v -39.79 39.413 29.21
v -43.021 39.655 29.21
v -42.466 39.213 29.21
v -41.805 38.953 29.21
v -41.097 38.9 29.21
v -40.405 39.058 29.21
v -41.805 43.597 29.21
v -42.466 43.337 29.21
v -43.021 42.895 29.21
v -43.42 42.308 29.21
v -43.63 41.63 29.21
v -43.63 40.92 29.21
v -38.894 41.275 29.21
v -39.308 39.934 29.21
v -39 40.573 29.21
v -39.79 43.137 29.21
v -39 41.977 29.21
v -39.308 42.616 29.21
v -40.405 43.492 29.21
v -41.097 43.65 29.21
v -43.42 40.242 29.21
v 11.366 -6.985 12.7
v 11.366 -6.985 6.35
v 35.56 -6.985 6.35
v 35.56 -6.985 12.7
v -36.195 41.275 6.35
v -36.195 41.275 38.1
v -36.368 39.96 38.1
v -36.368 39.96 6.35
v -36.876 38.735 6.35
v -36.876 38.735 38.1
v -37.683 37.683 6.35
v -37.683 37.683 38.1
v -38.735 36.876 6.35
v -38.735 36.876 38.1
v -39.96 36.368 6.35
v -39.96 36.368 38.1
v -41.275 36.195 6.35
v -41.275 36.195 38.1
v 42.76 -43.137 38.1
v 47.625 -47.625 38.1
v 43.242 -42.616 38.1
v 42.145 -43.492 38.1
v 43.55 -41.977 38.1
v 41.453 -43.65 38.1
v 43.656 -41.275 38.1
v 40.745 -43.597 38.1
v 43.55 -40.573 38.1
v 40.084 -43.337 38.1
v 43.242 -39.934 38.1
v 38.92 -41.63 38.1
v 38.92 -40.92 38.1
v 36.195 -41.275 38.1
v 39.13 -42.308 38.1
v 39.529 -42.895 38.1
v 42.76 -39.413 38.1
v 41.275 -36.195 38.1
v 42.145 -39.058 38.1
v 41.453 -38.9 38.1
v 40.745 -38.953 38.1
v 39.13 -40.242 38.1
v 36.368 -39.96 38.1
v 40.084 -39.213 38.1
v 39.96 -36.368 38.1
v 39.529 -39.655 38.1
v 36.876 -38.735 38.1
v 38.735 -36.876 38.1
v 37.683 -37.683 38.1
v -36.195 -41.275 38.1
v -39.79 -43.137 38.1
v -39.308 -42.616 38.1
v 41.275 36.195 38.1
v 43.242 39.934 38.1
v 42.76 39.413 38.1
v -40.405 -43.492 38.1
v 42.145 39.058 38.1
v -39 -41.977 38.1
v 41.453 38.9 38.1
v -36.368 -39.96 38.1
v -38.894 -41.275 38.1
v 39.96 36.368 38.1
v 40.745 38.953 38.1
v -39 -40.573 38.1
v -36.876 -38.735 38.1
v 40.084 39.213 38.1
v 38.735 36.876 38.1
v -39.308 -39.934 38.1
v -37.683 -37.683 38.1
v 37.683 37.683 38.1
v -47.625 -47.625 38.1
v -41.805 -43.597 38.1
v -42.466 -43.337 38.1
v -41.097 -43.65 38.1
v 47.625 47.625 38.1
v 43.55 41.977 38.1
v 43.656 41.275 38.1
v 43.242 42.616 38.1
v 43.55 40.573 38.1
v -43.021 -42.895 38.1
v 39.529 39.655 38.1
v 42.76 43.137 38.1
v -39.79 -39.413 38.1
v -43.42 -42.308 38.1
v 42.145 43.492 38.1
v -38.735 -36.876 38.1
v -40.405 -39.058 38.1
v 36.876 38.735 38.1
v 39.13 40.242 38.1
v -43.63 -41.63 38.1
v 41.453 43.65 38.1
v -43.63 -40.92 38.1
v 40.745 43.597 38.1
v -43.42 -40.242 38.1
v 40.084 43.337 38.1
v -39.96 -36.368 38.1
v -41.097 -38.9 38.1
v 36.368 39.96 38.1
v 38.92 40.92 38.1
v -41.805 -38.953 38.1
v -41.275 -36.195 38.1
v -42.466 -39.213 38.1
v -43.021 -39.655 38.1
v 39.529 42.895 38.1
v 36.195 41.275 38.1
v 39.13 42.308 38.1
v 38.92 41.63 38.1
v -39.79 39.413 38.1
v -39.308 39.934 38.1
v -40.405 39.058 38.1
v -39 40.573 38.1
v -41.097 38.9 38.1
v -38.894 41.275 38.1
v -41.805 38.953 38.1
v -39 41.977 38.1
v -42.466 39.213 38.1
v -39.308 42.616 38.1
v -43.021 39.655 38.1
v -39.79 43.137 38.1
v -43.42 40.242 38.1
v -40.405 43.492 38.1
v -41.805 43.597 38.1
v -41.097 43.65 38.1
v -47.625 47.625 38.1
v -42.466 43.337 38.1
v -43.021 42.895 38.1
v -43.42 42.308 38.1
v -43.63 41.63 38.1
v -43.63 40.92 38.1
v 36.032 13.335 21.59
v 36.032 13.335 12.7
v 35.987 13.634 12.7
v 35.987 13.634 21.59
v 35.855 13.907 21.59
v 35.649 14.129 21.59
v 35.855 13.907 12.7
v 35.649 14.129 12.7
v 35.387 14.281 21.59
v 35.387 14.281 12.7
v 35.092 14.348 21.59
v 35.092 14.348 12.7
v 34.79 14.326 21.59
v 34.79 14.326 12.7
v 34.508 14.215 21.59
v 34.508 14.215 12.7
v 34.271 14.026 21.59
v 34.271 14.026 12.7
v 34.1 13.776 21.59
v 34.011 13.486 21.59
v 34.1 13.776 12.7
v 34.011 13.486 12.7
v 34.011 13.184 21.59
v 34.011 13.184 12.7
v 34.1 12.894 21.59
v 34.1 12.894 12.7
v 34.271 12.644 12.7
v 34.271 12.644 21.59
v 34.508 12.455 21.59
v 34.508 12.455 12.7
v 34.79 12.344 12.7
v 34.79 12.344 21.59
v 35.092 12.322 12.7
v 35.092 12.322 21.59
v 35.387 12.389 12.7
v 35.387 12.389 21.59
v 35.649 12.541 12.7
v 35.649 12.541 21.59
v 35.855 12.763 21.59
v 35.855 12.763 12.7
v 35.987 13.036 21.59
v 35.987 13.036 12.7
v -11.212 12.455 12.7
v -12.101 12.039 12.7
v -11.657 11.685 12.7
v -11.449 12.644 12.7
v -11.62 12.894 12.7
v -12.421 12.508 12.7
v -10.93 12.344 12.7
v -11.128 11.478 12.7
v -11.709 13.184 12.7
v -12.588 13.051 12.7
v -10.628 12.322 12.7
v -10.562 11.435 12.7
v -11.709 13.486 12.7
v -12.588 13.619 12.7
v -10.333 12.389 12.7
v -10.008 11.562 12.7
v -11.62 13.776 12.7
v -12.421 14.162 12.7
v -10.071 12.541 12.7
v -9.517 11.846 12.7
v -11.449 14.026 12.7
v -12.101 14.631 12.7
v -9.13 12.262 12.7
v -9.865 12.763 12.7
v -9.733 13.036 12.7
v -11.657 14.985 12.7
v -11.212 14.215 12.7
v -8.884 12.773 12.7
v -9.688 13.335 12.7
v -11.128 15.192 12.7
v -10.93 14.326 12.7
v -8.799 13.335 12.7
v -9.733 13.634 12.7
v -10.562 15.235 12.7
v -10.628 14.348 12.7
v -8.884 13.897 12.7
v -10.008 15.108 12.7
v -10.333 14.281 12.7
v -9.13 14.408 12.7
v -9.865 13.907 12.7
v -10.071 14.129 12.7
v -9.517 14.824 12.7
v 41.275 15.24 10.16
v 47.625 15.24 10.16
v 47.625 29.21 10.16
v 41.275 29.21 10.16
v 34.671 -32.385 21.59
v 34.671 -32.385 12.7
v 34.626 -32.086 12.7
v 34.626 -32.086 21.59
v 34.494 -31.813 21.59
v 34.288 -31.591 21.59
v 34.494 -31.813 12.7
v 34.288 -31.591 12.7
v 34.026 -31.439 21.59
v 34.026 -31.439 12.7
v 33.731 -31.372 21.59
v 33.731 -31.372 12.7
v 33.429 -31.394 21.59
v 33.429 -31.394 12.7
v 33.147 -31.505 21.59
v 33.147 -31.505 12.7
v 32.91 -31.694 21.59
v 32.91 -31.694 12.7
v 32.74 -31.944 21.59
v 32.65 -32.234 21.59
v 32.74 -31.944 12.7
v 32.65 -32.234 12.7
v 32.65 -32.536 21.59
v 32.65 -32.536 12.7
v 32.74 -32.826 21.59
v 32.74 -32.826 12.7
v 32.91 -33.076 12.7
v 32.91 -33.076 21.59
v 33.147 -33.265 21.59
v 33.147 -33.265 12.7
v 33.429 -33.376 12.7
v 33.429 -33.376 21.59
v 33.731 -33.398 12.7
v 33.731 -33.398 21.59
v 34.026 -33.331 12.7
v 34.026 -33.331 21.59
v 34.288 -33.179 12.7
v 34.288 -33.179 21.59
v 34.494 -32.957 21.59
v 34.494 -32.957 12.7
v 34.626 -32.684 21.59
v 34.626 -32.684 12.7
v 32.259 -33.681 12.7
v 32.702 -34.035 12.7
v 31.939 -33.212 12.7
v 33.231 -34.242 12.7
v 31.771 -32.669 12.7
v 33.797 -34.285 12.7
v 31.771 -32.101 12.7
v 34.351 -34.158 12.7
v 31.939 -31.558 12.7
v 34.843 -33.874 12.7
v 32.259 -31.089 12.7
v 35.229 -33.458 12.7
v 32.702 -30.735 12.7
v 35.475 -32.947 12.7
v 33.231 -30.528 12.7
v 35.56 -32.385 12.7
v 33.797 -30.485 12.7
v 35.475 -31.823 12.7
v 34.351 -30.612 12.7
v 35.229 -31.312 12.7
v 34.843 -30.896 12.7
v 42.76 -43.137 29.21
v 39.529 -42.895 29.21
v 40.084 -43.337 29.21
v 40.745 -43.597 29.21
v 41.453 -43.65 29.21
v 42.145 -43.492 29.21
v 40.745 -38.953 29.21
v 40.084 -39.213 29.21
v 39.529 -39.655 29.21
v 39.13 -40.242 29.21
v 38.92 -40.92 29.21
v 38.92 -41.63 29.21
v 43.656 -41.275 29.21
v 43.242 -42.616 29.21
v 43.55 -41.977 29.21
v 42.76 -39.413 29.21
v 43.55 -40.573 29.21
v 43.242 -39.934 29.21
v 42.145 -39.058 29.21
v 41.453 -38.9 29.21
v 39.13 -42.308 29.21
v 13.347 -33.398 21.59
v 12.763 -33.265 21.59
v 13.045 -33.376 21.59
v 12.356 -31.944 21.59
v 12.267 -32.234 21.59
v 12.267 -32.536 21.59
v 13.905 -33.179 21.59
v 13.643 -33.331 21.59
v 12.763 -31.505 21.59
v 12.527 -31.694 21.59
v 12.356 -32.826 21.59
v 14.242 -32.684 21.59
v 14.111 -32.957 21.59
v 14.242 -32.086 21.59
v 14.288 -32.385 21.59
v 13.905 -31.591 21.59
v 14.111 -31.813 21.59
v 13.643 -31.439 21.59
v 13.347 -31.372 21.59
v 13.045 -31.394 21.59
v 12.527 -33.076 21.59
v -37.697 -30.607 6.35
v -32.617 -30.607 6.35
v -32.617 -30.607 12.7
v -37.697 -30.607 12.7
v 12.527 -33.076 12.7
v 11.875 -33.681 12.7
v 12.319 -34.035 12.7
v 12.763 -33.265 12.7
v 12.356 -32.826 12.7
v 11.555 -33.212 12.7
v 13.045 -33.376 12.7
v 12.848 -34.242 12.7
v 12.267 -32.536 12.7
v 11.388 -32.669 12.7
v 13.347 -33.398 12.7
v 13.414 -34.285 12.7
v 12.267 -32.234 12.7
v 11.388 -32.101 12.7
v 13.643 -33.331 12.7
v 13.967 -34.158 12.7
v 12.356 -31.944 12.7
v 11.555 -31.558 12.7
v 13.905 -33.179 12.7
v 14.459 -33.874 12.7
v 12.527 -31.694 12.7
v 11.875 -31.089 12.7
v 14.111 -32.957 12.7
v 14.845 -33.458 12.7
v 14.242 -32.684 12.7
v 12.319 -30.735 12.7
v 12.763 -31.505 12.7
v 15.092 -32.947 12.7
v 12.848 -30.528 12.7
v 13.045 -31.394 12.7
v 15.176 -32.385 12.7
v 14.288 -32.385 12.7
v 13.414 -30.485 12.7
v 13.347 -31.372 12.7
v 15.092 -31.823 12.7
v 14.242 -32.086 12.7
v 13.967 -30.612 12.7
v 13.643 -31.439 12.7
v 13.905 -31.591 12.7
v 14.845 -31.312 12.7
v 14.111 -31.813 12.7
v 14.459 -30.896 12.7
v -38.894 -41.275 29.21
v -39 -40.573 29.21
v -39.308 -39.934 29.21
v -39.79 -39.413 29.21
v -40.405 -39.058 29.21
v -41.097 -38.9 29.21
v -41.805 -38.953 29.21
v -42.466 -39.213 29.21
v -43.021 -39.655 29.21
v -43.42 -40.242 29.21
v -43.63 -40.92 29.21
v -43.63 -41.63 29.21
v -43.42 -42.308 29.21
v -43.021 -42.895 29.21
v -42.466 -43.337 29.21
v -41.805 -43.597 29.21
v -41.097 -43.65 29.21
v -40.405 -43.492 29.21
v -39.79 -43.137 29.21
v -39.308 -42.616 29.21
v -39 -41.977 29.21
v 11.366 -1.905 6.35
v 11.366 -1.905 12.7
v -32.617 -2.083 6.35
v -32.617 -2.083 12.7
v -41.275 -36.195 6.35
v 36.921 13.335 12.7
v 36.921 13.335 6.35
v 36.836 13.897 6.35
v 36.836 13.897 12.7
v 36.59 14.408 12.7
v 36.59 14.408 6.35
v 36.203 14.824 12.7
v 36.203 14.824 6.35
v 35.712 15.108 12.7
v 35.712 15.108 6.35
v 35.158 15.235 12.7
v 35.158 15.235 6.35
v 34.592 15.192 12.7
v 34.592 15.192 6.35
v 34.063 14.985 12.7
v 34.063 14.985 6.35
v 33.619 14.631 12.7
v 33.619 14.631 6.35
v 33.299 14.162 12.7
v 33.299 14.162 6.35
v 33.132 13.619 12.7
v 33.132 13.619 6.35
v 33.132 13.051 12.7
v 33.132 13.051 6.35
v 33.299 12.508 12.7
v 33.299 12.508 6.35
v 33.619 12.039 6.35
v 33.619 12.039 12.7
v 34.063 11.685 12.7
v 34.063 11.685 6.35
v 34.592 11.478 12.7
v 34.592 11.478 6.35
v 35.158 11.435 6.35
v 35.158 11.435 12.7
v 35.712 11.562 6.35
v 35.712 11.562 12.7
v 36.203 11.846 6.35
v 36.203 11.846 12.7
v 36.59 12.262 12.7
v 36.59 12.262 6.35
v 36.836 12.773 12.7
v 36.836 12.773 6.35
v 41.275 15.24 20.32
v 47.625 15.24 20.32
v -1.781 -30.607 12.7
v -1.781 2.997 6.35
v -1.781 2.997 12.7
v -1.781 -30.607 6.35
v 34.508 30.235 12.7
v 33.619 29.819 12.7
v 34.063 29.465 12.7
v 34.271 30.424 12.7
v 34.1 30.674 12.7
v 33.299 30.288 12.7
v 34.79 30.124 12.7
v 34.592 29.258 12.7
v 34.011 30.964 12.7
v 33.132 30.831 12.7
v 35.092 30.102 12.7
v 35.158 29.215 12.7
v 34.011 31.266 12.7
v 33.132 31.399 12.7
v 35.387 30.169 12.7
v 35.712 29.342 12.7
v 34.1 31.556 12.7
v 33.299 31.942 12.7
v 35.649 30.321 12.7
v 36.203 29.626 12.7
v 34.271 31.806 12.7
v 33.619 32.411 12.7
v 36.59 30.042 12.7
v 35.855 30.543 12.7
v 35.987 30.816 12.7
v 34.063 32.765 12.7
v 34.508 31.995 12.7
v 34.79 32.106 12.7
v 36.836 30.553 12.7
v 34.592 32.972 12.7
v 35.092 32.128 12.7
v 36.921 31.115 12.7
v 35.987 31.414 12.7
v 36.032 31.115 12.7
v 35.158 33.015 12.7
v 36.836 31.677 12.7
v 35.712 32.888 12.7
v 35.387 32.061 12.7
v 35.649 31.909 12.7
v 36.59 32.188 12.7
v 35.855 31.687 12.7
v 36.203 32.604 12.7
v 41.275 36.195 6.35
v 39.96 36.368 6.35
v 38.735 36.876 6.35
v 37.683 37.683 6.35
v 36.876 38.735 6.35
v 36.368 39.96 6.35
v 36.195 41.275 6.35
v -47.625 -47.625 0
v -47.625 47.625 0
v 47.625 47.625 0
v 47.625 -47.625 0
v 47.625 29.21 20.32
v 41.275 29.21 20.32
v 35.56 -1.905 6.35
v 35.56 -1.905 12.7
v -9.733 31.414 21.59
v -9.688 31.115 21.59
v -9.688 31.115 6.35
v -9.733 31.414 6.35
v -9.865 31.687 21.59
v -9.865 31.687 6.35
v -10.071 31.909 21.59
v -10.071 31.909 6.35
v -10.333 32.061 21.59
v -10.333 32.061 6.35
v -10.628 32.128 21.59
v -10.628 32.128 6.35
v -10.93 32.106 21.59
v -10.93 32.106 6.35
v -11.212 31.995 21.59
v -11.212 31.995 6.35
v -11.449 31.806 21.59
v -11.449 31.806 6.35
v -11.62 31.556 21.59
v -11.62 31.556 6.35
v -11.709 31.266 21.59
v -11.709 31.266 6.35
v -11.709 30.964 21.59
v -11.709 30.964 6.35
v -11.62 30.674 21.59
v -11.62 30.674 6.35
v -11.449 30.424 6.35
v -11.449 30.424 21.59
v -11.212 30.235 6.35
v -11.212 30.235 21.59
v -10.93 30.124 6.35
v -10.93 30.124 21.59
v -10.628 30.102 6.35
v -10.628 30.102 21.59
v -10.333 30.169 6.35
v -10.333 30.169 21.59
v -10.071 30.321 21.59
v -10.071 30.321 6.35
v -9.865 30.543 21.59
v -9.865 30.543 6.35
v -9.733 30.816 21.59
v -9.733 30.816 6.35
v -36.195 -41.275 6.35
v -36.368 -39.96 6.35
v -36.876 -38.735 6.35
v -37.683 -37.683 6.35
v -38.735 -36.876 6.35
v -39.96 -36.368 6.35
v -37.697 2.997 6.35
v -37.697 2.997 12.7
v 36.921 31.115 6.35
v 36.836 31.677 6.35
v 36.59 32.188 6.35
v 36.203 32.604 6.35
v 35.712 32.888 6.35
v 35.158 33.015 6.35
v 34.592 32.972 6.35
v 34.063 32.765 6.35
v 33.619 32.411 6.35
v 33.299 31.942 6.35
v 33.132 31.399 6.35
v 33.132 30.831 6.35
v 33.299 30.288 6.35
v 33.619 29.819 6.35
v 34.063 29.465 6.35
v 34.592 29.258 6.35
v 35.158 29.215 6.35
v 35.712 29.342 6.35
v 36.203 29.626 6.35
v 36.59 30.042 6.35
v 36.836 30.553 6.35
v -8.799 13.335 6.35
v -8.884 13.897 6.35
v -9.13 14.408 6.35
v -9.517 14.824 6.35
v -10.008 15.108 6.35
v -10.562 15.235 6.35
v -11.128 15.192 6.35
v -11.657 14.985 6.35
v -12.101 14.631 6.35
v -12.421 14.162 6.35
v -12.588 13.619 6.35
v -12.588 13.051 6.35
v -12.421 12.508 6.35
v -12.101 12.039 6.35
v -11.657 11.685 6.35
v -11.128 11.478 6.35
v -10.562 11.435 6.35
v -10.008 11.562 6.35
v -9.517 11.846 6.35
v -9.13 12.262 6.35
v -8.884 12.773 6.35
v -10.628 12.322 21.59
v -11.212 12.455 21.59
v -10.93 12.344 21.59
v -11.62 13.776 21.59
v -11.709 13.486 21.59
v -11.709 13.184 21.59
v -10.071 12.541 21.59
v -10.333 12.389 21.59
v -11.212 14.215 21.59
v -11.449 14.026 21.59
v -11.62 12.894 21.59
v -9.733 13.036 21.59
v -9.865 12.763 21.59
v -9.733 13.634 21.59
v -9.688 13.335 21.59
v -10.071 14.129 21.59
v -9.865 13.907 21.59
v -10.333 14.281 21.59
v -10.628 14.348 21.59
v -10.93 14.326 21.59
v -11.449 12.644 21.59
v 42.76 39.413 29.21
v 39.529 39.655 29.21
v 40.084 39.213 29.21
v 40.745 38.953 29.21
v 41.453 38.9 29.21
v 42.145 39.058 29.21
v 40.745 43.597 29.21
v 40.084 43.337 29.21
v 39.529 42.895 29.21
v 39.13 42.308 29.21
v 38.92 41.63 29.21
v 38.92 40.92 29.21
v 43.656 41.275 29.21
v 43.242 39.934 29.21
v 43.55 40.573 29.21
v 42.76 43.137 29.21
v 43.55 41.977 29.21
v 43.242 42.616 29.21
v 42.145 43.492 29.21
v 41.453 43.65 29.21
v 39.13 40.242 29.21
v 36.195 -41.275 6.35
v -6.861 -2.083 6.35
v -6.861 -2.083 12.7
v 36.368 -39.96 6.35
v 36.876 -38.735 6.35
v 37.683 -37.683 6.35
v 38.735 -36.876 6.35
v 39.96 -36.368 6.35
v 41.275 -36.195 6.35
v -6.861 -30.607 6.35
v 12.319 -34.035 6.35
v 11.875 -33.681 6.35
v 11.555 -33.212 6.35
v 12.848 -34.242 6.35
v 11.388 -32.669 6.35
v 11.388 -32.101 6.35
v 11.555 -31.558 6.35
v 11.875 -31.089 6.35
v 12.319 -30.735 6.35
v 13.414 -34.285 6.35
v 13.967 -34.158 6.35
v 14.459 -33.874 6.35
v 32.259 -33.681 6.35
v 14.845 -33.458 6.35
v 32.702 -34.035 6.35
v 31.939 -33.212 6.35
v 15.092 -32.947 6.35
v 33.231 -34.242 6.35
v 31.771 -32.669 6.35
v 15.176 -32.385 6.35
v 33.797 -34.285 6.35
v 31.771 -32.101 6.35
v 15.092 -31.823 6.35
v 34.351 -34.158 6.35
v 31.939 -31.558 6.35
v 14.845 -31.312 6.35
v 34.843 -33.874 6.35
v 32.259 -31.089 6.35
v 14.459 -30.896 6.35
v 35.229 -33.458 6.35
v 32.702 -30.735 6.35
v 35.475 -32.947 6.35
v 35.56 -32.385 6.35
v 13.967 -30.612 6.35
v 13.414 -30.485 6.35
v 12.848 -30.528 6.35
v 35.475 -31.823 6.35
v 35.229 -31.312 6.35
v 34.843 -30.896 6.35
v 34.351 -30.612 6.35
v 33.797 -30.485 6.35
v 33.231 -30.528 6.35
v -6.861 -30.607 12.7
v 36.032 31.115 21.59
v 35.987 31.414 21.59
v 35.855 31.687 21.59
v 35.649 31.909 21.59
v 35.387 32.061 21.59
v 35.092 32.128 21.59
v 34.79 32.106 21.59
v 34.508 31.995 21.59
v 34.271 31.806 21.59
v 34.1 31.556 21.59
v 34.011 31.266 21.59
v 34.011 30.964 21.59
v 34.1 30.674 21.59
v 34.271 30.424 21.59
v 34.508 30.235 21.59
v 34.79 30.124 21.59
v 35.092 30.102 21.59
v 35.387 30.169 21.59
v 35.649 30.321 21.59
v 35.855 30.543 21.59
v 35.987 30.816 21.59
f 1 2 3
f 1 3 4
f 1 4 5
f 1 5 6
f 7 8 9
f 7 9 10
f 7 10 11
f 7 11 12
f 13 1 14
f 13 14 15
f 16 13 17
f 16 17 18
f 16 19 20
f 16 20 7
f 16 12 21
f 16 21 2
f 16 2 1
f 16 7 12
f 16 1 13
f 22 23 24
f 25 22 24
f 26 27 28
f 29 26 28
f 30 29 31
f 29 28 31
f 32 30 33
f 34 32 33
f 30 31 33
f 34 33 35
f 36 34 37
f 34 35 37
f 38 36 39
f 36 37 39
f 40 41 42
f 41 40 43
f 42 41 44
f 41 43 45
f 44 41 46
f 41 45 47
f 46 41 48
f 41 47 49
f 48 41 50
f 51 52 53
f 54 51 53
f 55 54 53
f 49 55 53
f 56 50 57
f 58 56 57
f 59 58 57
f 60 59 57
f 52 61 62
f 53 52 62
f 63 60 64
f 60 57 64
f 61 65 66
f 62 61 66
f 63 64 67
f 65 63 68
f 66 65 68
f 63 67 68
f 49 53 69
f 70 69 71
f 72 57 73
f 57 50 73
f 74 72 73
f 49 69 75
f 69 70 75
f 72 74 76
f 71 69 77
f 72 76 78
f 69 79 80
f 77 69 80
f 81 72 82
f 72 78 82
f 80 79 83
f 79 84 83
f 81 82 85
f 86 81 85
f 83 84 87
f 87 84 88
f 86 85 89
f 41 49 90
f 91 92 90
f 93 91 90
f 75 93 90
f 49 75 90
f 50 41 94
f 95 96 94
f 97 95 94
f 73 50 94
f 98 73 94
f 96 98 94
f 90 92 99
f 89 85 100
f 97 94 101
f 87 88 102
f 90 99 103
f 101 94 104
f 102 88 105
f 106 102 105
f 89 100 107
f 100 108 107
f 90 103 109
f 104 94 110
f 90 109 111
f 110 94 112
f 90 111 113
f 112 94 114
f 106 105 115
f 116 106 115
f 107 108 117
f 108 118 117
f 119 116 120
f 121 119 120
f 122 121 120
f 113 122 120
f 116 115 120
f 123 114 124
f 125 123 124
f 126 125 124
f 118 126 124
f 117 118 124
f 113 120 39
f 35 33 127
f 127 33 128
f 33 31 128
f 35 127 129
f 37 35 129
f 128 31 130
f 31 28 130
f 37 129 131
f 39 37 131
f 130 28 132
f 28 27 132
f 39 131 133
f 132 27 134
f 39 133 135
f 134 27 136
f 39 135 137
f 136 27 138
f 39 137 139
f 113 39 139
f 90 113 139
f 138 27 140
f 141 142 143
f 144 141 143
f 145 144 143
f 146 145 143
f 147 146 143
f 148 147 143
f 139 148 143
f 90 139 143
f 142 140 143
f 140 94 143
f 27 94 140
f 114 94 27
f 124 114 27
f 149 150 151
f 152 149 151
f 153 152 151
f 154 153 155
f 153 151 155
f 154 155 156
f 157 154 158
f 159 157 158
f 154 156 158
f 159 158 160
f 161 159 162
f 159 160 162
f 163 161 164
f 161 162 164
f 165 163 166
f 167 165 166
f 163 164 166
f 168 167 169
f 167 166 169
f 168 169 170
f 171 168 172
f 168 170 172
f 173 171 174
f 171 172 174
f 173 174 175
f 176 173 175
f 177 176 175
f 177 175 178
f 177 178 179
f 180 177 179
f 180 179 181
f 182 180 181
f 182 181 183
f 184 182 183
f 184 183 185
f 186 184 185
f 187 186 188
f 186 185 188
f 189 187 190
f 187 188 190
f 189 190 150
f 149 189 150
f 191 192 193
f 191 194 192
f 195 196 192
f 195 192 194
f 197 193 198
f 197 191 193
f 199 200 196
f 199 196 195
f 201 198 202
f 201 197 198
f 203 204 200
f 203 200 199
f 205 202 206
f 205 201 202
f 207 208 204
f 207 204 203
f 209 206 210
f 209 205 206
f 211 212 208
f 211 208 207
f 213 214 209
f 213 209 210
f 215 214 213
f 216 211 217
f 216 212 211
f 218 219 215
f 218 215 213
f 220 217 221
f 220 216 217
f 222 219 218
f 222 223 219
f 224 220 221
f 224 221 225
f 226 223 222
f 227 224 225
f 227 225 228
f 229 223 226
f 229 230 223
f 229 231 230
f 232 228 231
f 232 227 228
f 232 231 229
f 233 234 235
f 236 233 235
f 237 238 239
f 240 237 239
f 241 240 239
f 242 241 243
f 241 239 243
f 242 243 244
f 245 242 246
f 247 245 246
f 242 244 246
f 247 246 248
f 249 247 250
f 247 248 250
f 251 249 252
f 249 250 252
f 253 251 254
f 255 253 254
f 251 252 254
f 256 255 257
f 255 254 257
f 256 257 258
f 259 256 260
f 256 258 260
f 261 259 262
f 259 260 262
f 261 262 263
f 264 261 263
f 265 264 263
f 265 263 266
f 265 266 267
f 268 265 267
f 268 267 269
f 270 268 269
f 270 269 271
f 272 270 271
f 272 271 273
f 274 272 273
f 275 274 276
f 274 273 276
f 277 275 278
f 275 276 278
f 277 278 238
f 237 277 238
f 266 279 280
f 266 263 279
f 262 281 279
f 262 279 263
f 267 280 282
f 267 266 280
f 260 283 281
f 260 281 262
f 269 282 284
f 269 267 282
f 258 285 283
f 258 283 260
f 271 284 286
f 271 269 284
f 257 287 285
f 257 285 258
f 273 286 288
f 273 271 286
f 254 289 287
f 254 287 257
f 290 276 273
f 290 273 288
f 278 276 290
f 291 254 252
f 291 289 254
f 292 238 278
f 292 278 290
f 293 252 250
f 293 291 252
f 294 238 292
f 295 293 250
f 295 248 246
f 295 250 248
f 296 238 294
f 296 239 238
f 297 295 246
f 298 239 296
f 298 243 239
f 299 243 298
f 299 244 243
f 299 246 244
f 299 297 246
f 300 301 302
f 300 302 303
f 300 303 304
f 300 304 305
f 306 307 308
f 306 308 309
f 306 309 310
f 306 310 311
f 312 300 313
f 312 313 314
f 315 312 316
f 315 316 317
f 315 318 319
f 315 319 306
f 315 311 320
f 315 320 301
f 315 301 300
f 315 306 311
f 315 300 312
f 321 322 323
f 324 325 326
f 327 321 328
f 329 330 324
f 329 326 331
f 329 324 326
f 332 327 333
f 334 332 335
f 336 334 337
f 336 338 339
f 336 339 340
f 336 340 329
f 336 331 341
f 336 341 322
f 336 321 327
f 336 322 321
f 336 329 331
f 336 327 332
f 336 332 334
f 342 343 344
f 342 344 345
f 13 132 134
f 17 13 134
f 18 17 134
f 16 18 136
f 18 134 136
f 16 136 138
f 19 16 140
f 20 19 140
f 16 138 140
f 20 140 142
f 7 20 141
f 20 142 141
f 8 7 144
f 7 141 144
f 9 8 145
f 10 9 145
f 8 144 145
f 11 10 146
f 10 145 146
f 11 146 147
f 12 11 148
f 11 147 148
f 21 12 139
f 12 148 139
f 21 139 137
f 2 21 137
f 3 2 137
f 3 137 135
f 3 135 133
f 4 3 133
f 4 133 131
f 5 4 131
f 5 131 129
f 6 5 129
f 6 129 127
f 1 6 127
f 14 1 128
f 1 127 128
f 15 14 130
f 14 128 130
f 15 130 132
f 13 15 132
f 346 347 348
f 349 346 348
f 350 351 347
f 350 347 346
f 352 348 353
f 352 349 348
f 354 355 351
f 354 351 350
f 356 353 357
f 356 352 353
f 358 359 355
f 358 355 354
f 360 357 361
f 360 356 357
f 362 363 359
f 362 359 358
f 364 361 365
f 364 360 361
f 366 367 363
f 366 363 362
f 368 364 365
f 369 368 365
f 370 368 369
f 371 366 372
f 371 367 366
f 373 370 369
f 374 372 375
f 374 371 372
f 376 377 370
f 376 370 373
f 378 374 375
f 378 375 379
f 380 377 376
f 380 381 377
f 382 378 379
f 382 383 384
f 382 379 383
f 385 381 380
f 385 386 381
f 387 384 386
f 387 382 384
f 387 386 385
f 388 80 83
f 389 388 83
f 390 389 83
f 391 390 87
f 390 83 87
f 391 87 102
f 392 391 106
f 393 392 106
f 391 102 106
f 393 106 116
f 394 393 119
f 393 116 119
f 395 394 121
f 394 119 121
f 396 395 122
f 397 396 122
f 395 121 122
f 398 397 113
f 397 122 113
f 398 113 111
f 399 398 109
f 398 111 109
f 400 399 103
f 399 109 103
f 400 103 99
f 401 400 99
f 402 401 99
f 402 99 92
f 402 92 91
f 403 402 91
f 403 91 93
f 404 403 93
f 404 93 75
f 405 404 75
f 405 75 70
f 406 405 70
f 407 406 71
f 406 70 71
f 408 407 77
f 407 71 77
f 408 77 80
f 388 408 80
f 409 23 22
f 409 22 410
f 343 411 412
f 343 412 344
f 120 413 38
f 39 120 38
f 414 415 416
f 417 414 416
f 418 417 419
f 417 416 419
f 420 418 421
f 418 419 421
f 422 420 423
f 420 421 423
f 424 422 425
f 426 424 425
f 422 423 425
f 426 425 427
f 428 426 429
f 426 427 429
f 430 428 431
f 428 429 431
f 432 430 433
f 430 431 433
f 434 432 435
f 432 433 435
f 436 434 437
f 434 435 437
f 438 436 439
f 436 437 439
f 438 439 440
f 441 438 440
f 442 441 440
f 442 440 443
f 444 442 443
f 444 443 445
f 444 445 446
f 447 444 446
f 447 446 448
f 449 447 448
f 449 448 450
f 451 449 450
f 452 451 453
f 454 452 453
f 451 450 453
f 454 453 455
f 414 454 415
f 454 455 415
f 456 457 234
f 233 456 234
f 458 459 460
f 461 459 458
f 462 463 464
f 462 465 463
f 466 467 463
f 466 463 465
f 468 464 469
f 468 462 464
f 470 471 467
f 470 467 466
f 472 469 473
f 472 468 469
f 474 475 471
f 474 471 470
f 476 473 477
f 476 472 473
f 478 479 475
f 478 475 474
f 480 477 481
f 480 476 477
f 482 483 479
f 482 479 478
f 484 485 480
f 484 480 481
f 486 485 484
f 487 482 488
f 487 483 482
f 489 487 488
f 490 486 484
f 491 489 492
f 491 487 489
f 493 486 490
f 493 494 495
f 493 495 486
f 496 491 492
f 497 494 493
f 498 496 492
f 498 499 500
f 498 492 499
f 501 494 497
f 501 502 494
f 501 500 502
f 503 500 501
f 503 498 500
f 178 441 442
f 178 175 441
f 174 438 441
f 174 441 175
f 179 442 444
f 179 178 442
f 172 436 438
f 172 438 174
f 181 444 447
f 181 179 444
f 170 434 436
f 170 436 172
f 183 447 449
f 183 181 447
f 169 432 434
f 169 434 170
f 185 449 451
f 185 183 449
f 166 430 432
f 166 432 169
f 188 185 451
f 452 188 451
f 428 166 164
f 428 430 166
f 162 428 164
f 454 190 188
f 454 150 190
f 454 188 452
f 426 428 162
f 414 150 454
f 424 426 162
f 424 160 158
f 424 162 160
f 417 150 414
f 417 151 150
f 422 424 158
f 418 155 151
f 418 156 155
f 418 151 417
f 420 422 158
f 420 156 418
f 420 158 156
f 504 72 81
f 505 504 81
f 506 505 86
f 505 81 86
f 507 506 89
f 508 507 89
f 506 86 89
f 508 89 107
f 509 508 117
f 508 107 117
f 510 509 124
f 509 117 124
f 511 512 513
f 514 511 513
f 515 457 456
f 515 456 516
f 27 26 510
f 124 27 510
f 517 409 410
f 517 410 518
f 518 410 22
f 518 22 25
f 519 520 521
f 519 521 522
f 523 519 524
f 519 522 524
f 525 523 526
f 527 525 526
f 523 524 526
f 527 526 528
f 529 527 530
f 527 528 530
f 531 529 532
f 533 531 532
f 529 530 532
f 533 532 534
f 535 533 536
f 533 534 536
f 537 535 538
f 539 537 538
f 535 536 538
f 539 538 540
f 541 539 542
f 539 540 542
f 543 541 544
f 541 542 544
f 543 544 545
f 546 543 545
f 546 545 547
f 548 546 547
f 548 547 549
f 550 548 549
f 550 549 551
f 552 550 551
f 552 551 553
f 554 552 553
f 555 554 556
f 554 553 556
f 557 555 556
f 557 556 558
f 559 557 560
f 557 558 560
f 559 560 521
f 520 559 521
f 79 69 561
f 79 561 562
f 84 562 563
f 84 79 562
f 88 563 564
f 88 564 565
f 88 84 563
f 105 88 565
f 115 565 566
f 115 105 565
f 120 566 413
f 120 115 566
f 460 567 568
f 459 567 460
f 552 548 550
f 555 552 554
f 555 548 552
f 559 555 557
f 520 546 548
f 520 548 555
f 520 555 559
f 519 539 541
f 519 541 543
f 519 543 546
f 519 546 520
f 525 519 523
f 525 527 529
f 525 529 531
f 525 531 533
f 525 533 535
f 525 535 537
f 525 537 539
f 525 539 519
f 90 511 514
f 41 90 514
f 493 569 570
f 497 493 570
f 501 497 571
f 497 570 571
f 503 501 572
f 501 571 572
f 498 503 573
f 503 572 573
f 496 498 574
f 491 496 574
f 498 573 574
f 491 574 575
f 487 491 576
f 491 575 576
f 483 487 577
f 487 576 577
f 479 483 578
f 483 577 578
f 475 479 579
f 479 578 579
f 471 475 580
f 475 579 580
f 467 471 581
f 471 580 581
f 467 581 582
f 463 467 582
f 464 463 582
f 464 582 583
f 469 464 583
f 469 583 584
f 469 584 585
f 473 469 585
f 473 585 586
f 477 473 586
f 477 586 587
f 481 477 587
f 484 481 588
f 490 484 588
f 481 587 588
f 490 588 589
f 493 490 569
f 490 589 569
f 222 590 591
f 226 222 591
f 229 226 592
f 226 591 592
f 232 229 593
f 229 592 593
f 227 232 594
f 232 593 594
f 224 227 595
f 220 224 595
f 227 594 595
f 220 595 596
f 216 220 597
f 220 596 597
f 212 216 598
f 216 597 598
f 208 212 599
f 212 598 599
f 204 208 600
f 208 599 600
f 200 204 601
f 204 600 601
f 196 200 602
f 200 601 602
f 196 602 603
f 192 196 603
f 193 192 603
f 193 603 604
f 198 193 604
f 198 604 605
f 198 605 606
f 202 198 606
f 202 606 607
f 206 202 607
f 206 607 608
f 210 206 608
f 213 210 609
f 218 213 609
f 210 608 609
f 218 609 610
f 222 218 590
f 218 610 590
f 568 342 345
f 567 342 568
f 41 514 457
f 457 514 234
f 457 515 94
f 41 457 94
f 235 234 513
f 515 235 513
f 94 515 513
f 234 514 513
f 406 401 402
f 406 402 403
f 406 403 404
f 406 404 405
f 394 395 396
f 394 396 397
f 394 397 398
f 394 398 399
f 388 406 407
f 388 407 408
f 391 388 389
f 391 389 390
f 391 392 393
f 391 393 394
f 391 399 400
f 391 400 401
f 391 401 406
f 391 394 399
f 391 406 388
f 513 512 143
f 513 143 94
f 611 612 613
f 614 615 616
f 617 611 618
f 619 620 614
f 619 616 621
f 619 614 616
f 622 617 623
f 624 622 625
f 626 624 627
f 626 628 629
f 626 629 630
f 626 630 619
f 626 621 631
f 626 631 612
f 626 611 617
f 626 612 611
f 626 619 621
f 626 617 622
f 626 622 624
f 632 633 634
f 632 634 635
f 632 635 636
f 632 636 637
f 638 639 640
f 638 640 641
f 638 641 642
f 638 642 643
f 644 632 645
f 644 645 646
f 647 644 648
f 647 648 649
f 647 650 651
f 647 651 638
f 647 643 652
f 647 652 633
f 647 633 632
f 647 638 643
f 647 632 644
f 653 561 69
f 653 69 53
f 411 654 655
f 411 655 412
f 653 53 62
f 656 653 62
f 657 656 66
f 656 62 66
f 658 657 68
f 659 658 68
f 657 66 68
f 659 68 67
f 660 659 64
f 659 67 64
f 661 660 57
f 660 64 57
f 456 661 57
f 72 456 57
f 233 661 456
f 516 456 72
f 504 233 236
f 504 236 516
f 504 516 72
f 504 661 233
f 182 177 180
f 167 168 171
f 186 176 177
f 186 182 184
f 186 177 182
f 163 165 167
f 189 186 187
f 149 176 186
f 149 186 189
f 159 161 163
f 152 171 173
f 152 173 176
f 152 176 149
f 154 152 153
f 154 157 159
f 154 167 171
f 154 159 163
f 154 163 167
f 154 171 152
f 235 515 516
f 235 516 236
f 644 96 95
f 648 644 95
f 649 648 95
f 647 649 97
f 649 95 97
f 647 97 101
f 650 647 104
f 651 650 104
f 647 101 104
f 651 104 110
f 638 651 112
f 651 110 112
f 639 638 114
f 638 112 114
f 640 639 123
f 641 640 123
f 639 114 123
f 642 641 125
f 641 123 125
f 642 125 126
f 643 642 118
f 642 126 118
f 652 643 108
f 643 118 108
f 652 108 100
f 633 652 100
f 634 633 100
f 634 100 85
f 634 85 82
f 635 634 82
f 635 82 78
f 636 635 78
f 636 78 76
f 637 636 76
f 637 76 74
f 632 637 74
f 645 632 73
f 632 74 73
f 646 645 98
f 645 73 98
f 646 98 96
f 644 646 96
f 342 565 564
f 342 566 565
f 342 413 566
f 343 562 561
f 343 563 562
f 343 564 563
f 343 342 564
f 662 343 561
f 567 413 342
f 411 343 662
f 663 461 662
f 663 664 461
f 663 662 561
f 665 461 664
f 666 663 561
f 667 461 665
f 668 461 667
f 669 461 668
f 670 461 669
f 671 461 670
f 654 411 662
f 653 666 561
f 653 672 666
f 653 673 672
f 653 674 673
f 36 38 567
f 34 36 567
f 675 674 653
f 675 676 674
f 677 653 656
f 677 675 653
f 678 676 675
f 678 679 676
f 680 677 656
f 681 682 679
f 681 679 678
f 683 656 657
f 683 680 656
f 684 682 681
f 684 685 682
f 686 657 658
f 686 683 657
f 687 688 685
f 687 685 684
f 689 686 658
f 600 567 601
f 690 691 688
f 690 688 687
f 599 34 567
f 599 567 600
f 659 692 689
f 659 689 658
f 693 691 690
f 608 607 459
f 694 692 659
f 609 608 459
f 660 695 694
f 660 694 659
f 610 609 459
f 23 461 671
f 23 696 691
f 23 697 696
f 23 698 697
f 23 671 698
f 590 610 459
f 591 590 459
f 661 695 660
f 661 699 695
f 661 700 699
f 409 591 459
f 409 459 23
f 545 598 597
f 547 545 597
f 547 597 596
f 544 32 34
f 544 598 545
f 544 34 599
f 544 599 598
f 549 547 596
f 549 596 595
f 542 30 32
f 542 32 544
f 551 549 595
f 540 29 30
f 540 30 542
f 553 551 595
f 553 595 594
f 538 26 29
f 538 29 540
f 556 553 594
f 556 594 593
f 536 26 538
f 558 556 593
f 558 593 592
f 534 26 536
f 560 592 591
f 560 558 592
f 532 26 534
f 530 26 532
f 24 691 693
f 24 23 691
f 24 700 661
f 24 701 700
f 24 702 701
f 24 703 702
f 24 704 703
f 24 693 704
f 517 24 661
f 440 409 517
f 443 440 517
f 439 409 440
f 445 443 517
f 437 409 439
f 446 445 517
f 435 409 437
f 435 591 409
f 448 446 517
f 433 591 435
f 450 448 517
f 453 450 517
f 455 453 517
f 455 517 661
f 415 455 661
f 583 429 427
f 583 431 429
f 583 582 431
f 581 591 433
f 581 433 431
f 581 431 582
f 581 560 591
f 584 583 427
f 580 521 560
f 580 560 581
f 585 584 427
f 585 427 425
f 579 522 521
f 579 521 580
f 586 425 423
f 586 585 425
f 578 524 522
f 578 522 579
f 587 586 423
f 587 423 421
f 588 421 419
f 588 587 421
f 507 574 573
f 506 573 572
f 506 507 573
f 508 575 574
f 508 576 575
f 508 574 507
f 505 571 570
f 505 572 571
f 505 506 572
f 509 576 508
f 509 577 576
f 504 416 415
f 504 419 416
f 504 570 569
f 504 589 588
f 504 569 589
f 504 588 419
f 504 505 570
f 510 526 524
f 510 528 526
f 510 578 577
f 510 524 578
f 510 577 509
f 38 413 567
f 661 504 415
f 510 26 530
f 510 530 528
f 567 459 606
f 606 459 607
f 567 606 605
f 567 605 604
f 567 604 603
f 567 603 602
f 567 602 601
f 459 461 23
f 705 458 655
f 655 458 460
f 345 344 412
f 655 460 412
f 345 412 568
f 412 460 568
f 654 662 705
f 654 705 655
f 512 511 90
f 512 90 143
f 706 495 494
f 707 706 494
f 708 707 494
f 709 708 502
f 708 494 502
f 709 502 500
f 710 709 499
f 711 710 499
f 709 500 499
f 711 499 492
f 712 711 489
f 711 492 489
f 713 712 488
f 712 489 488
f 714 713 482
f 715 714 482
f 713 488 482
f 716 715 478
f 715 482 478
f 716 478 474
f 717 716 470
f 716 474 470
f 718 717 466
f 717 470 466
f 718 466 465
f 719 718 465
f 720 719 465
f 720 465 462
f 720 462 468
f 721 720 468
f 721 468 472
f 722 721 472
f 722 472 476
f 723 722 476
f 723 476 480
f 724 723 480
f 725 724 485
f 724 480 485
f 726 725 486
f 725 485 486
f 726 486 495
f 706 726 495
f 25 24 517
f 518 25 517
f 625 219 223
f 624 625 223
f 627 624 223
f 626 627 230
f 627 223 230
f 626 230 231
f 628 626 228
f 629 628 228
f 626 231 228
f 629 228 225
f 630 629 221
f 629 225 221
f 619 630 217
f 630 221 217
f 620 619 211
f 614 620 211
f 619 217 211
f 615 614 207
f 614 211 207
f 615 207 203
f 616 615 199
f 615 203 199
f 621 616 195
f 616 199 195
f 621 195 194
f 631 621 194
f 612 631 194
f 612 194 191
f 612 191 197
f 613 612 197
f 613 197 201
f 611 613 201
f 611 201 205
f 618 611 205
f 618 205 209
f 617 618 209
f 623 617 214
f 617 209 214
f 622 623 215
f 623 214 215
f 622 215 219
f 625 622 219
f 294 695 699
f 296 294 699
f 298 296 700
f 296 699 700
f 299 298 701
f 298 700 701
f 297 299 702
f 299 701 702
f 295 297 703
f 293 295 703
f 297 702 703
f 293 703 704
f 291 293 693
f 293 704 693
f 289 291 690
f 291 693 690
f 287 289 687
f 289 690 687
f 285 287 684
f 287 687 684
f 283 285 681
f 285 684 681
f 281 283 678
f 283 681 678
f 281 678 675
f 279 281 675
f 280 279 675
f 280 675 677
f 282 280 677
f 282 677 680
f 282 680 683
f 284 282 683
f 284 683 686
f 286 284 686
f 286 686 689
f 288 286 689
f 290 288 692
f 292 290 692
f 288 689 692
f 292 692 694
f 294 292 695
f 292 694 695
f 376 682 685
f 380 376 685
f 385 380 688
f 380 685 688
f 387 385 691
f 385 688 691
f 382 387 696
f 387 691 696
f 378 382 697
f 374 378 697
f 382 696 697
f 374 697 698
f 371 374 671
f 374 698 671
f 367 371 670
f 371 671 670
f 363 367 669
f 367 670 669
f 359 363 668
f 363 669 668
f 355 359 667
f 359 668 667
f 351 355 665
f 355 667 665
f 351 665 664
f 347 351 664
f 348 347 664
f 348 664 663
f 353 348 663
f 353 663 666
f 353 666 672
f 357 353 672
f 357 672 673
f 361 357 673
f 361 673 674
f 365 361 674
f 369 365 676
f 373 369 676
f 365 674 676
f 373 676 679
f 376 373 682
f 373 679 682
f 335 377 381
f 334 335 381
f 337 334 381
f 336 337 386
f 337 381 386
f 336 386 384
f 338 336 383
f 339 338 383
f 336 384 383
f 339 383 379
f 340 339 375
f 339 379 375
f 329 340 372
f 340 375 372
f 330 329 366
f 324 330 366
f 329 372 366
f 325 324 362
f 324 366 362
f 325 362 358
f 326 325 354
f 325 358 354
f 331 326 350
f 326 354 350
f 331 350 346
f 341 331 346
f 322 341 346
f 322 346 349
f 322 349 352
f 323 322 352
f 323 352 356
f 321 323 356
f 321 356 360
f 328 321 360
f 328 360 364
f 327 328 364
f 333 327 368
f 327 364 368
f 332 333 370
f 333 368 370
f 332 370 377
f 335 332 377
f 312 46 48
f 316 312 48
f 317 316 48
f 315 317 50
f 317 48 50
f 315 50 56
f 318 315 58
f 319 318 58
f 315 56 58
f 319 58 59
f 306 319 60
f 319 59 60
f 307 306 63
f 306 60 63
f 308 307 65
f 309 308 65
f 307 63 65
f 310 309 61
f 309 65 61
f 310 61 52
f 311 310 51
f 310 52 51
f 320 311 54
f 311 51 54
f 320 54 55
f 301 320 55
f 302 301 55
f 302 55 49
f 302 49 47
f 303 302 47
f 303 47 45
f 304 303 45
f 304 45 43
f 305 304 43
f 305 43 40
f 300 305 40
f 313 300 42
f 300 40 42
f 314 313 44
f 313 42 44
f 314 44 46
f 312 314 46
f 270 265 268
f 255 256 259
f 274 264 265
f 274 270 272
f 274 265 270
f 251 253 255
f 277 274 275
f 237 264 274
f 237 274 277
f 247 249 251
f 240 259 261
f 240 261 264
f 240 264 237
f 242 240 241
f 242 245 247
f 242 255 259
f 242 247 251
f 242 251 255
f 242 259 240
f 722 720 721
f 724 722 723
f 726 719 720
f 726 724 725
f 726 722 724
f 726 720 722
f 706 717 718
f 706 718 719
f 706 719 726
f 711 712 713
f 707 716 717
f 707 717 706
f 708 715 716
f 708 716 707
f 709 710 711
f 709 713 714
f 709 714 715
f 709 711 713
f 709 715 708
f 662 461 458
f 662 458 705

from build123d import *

# Parameters (mm, degrees)
SKETCH1_W           = 95.25
SKETCH1_H           = 95.25
BOSS_EXTRUDE1_DEPTH = 38.1
SHELL1_T            = -6.35
BOSS_EXTRUDE2_DEPTH = 31.75
SKETCH3_R           = 1.905
SKETCH3_R_2         = 1.016
BOSS_EXTRUDE3_DEPTH = 6.35
SKETCH4_R           = 1.016
BOSS_EXTRUDE4_DEPTH = 8.89
SKETCH5_R           = 1.905
SKETCH5_W           = 24.1935
SKETCH5_H           = 5.08
BOSS_EXTRUDE5_DEPTH = 6.35
SKETCH7_R           = 1.016
BOSS_EXTRUDE6_DEPTH = 8.89
SKETCH8_R           = 2.38125
CUT_EXTRUDE1_DEPTH  = 8.89
BOSS_EXTRUDE7_DEPTH = 6.35
SKETCH12_W          = 10.16
SKETCH12_H          = 13.97
CUT_EXTRUDE2_DEPTH  = 6.35


with BuildPart() as part:
    # Sketch1 → Boss-Extrude1 (new body)
    with BuildSketch(Plane.XY):
        Rectangle(SKETCH1_W, SKETCH1_H)
    extrude(amount=BOSS_EXTRUDE1_DEPTH)

    # Shell1
    shell1_openings = [part.faces().sort_by_distance(p)[0] for p in [
        (0, 0, 38.1),
    ]]
    offset(amount=SHELL1_T, openings=shell1_openings, kind=Kind.INTERSECTION)

    # Sketch2 → Boss-Extrude2 (add)
    with BuildSketch(Plane.XY.offset(38.1)):
        with BuildLine():
            Line((-41.275, 41.275), (-36.195, 41.275))
            ThreePointArc((-36.195, 41.275), (-37.682897552, 37.682897552), (-41.275, 36.195))
            Line((-41.275, 36.195), (-41.275, 41.275))
        make_face()
        with BuildLine():
            Line((36.195, 41.275), (41.275, 41.275))
            Line((41.275, 41.275), (41.275, 36.195))
            ThreePointArc((41.275, 36.195), (37.682897552, 37.682897552), (36.195, 41.275))
        make_face()
        with BuildLine():
            Line((41.275, -36.195), (41.275, -41.275))
            Line((41.275, -41.275), (36.195, -41.275))
            ThreePointArc((36.195, -41.275), (37.682897552, -37.682897552), (41.275, -36.195))
        make_face()
        with BuildLine():
            Line((-41.275, -36.195), (-41.275, -41.275))
            Line((-41.275, -41.275), (-36.195, -41.275))
            ThreePointArc((-36.195, -41.275), (-37.682897552, -37.682897552), (-41.275, -36.195))
        make_face()
    extrude(amount=-BOSS_EXTRUDE2_DEPTH)

    # Sketch3 → Boss-Extrude3 (add)
    with BuildSketch(Plane.XY.offset(6.35)):
        with Locations((35.015710728, 31.115)):
            Circle(SKETCH3_R)
        with Locations((-10.704289272, 31.115)):
            Circle(SKETCH3_R_2)
        with Locations((-10.704289272, 13.335)):
            Circle(SKETCH3_R)
        with Locations((35.015710728, 13.335)):
            Circle(SKETCH3_R)
    extrude(amount=BOSS_EXTRUDE3_DEPTH)

    # Sketch4 → Boss-Extrude4 (add)
    with BuildSketch(Plane.XY.offset(12.7)):
        with Locations((-10.704289272, 31.115)):
            Circle(SKETCH4_R)
        with Locations((-10.704289272, 13.335)):
            Circle(SKETCH4_R)
        with Locations((35.015710728, 31.115)):
            Circle(SKETCH4_R)
        with Locations((35.015710728, 13.335)):
            Circle(SKETCH4_R)
    extrude(amount=BOSS_EXTRUDE4_DEPTH)

    # Sketch5 → Boss-Extrude5 (add)
    with BuildSketch(Plane.XY.offset(6.35)):
        with Locations((13.2715, -32.385)):
            Circle(SKETCH5_R)
        with Locations((33.655, -32.385)):
            Circle(SKETCH5_R)
        with Locations((23.46325, -4.445)):
            Rectangle(SKETCH5_W, SKETCH5_H)
    extrude(amount=BOSS_EXTRUDE5_DEPTH)

    # Sketch7 → Boss-Extrude6 (add)
    with BuildSketch(Plane.XY.offset(12.7)):
        with Locations((13.2715, -32.385)):
            Circle(SKETCH7_R)
        with Locations((33.655, -32.385)):
            Circle(SKETCH7_R)
    extrude(amount=BOSS_EXTRUDE6_DEPTH)

    # Sketch8 → Cut-Extrude1 (cut)
    with BuildSketch(Plane.XY.offset(38.1)):
        with Locations((-41.275, 41.275)):
            Circle(SKETCH8_R)
        with Locations((41.275, 41.275)):
            Circle(SKETCH8_R)
        with Locations((41.275, -41.275)):
            Circle(SKETCH8_R)
        with Locations((-41.275, -41.275)):
            Circle(SKETCH8_R)
    extrude(amount=-CUT_EXTRUDE1_DEPTH, mode=Mode.SUBTRACT)

    # Sketch10 → Boss-Extrude7 (add)
    with BuildSketch(Plane.XY.offset(6.35)):
        Polygon((-37.696932409, -30.607), (-37.696932409, 2.9972), (-1.781332409, 2.9972), (-1.781332409, -30.607), (-6.861332409, -30.607), (-6.861332409, -2.0828), (-32.616932409, -2.0828), (-32.616932409, -30.607), align=None)
    extrude(amount=BOSS_EXTRUDE7_DEPTH)

    # Sketch12 → Cut-Extrude2 (cut)
    with BuildSketch(Plane(origin=(47.625, 0, 0), x_dir=(0, 0, -1), z_dir=(1, 0, 0))):
        with Locations((-15.24, 22.225)):
            Rectangle(SKETCH12_W, SKETCH12_H)
    extrude(amount=-CUT_EXTRUDE2_DEPTH, mode=Mode.SUBTRACT)


solid = part.part
